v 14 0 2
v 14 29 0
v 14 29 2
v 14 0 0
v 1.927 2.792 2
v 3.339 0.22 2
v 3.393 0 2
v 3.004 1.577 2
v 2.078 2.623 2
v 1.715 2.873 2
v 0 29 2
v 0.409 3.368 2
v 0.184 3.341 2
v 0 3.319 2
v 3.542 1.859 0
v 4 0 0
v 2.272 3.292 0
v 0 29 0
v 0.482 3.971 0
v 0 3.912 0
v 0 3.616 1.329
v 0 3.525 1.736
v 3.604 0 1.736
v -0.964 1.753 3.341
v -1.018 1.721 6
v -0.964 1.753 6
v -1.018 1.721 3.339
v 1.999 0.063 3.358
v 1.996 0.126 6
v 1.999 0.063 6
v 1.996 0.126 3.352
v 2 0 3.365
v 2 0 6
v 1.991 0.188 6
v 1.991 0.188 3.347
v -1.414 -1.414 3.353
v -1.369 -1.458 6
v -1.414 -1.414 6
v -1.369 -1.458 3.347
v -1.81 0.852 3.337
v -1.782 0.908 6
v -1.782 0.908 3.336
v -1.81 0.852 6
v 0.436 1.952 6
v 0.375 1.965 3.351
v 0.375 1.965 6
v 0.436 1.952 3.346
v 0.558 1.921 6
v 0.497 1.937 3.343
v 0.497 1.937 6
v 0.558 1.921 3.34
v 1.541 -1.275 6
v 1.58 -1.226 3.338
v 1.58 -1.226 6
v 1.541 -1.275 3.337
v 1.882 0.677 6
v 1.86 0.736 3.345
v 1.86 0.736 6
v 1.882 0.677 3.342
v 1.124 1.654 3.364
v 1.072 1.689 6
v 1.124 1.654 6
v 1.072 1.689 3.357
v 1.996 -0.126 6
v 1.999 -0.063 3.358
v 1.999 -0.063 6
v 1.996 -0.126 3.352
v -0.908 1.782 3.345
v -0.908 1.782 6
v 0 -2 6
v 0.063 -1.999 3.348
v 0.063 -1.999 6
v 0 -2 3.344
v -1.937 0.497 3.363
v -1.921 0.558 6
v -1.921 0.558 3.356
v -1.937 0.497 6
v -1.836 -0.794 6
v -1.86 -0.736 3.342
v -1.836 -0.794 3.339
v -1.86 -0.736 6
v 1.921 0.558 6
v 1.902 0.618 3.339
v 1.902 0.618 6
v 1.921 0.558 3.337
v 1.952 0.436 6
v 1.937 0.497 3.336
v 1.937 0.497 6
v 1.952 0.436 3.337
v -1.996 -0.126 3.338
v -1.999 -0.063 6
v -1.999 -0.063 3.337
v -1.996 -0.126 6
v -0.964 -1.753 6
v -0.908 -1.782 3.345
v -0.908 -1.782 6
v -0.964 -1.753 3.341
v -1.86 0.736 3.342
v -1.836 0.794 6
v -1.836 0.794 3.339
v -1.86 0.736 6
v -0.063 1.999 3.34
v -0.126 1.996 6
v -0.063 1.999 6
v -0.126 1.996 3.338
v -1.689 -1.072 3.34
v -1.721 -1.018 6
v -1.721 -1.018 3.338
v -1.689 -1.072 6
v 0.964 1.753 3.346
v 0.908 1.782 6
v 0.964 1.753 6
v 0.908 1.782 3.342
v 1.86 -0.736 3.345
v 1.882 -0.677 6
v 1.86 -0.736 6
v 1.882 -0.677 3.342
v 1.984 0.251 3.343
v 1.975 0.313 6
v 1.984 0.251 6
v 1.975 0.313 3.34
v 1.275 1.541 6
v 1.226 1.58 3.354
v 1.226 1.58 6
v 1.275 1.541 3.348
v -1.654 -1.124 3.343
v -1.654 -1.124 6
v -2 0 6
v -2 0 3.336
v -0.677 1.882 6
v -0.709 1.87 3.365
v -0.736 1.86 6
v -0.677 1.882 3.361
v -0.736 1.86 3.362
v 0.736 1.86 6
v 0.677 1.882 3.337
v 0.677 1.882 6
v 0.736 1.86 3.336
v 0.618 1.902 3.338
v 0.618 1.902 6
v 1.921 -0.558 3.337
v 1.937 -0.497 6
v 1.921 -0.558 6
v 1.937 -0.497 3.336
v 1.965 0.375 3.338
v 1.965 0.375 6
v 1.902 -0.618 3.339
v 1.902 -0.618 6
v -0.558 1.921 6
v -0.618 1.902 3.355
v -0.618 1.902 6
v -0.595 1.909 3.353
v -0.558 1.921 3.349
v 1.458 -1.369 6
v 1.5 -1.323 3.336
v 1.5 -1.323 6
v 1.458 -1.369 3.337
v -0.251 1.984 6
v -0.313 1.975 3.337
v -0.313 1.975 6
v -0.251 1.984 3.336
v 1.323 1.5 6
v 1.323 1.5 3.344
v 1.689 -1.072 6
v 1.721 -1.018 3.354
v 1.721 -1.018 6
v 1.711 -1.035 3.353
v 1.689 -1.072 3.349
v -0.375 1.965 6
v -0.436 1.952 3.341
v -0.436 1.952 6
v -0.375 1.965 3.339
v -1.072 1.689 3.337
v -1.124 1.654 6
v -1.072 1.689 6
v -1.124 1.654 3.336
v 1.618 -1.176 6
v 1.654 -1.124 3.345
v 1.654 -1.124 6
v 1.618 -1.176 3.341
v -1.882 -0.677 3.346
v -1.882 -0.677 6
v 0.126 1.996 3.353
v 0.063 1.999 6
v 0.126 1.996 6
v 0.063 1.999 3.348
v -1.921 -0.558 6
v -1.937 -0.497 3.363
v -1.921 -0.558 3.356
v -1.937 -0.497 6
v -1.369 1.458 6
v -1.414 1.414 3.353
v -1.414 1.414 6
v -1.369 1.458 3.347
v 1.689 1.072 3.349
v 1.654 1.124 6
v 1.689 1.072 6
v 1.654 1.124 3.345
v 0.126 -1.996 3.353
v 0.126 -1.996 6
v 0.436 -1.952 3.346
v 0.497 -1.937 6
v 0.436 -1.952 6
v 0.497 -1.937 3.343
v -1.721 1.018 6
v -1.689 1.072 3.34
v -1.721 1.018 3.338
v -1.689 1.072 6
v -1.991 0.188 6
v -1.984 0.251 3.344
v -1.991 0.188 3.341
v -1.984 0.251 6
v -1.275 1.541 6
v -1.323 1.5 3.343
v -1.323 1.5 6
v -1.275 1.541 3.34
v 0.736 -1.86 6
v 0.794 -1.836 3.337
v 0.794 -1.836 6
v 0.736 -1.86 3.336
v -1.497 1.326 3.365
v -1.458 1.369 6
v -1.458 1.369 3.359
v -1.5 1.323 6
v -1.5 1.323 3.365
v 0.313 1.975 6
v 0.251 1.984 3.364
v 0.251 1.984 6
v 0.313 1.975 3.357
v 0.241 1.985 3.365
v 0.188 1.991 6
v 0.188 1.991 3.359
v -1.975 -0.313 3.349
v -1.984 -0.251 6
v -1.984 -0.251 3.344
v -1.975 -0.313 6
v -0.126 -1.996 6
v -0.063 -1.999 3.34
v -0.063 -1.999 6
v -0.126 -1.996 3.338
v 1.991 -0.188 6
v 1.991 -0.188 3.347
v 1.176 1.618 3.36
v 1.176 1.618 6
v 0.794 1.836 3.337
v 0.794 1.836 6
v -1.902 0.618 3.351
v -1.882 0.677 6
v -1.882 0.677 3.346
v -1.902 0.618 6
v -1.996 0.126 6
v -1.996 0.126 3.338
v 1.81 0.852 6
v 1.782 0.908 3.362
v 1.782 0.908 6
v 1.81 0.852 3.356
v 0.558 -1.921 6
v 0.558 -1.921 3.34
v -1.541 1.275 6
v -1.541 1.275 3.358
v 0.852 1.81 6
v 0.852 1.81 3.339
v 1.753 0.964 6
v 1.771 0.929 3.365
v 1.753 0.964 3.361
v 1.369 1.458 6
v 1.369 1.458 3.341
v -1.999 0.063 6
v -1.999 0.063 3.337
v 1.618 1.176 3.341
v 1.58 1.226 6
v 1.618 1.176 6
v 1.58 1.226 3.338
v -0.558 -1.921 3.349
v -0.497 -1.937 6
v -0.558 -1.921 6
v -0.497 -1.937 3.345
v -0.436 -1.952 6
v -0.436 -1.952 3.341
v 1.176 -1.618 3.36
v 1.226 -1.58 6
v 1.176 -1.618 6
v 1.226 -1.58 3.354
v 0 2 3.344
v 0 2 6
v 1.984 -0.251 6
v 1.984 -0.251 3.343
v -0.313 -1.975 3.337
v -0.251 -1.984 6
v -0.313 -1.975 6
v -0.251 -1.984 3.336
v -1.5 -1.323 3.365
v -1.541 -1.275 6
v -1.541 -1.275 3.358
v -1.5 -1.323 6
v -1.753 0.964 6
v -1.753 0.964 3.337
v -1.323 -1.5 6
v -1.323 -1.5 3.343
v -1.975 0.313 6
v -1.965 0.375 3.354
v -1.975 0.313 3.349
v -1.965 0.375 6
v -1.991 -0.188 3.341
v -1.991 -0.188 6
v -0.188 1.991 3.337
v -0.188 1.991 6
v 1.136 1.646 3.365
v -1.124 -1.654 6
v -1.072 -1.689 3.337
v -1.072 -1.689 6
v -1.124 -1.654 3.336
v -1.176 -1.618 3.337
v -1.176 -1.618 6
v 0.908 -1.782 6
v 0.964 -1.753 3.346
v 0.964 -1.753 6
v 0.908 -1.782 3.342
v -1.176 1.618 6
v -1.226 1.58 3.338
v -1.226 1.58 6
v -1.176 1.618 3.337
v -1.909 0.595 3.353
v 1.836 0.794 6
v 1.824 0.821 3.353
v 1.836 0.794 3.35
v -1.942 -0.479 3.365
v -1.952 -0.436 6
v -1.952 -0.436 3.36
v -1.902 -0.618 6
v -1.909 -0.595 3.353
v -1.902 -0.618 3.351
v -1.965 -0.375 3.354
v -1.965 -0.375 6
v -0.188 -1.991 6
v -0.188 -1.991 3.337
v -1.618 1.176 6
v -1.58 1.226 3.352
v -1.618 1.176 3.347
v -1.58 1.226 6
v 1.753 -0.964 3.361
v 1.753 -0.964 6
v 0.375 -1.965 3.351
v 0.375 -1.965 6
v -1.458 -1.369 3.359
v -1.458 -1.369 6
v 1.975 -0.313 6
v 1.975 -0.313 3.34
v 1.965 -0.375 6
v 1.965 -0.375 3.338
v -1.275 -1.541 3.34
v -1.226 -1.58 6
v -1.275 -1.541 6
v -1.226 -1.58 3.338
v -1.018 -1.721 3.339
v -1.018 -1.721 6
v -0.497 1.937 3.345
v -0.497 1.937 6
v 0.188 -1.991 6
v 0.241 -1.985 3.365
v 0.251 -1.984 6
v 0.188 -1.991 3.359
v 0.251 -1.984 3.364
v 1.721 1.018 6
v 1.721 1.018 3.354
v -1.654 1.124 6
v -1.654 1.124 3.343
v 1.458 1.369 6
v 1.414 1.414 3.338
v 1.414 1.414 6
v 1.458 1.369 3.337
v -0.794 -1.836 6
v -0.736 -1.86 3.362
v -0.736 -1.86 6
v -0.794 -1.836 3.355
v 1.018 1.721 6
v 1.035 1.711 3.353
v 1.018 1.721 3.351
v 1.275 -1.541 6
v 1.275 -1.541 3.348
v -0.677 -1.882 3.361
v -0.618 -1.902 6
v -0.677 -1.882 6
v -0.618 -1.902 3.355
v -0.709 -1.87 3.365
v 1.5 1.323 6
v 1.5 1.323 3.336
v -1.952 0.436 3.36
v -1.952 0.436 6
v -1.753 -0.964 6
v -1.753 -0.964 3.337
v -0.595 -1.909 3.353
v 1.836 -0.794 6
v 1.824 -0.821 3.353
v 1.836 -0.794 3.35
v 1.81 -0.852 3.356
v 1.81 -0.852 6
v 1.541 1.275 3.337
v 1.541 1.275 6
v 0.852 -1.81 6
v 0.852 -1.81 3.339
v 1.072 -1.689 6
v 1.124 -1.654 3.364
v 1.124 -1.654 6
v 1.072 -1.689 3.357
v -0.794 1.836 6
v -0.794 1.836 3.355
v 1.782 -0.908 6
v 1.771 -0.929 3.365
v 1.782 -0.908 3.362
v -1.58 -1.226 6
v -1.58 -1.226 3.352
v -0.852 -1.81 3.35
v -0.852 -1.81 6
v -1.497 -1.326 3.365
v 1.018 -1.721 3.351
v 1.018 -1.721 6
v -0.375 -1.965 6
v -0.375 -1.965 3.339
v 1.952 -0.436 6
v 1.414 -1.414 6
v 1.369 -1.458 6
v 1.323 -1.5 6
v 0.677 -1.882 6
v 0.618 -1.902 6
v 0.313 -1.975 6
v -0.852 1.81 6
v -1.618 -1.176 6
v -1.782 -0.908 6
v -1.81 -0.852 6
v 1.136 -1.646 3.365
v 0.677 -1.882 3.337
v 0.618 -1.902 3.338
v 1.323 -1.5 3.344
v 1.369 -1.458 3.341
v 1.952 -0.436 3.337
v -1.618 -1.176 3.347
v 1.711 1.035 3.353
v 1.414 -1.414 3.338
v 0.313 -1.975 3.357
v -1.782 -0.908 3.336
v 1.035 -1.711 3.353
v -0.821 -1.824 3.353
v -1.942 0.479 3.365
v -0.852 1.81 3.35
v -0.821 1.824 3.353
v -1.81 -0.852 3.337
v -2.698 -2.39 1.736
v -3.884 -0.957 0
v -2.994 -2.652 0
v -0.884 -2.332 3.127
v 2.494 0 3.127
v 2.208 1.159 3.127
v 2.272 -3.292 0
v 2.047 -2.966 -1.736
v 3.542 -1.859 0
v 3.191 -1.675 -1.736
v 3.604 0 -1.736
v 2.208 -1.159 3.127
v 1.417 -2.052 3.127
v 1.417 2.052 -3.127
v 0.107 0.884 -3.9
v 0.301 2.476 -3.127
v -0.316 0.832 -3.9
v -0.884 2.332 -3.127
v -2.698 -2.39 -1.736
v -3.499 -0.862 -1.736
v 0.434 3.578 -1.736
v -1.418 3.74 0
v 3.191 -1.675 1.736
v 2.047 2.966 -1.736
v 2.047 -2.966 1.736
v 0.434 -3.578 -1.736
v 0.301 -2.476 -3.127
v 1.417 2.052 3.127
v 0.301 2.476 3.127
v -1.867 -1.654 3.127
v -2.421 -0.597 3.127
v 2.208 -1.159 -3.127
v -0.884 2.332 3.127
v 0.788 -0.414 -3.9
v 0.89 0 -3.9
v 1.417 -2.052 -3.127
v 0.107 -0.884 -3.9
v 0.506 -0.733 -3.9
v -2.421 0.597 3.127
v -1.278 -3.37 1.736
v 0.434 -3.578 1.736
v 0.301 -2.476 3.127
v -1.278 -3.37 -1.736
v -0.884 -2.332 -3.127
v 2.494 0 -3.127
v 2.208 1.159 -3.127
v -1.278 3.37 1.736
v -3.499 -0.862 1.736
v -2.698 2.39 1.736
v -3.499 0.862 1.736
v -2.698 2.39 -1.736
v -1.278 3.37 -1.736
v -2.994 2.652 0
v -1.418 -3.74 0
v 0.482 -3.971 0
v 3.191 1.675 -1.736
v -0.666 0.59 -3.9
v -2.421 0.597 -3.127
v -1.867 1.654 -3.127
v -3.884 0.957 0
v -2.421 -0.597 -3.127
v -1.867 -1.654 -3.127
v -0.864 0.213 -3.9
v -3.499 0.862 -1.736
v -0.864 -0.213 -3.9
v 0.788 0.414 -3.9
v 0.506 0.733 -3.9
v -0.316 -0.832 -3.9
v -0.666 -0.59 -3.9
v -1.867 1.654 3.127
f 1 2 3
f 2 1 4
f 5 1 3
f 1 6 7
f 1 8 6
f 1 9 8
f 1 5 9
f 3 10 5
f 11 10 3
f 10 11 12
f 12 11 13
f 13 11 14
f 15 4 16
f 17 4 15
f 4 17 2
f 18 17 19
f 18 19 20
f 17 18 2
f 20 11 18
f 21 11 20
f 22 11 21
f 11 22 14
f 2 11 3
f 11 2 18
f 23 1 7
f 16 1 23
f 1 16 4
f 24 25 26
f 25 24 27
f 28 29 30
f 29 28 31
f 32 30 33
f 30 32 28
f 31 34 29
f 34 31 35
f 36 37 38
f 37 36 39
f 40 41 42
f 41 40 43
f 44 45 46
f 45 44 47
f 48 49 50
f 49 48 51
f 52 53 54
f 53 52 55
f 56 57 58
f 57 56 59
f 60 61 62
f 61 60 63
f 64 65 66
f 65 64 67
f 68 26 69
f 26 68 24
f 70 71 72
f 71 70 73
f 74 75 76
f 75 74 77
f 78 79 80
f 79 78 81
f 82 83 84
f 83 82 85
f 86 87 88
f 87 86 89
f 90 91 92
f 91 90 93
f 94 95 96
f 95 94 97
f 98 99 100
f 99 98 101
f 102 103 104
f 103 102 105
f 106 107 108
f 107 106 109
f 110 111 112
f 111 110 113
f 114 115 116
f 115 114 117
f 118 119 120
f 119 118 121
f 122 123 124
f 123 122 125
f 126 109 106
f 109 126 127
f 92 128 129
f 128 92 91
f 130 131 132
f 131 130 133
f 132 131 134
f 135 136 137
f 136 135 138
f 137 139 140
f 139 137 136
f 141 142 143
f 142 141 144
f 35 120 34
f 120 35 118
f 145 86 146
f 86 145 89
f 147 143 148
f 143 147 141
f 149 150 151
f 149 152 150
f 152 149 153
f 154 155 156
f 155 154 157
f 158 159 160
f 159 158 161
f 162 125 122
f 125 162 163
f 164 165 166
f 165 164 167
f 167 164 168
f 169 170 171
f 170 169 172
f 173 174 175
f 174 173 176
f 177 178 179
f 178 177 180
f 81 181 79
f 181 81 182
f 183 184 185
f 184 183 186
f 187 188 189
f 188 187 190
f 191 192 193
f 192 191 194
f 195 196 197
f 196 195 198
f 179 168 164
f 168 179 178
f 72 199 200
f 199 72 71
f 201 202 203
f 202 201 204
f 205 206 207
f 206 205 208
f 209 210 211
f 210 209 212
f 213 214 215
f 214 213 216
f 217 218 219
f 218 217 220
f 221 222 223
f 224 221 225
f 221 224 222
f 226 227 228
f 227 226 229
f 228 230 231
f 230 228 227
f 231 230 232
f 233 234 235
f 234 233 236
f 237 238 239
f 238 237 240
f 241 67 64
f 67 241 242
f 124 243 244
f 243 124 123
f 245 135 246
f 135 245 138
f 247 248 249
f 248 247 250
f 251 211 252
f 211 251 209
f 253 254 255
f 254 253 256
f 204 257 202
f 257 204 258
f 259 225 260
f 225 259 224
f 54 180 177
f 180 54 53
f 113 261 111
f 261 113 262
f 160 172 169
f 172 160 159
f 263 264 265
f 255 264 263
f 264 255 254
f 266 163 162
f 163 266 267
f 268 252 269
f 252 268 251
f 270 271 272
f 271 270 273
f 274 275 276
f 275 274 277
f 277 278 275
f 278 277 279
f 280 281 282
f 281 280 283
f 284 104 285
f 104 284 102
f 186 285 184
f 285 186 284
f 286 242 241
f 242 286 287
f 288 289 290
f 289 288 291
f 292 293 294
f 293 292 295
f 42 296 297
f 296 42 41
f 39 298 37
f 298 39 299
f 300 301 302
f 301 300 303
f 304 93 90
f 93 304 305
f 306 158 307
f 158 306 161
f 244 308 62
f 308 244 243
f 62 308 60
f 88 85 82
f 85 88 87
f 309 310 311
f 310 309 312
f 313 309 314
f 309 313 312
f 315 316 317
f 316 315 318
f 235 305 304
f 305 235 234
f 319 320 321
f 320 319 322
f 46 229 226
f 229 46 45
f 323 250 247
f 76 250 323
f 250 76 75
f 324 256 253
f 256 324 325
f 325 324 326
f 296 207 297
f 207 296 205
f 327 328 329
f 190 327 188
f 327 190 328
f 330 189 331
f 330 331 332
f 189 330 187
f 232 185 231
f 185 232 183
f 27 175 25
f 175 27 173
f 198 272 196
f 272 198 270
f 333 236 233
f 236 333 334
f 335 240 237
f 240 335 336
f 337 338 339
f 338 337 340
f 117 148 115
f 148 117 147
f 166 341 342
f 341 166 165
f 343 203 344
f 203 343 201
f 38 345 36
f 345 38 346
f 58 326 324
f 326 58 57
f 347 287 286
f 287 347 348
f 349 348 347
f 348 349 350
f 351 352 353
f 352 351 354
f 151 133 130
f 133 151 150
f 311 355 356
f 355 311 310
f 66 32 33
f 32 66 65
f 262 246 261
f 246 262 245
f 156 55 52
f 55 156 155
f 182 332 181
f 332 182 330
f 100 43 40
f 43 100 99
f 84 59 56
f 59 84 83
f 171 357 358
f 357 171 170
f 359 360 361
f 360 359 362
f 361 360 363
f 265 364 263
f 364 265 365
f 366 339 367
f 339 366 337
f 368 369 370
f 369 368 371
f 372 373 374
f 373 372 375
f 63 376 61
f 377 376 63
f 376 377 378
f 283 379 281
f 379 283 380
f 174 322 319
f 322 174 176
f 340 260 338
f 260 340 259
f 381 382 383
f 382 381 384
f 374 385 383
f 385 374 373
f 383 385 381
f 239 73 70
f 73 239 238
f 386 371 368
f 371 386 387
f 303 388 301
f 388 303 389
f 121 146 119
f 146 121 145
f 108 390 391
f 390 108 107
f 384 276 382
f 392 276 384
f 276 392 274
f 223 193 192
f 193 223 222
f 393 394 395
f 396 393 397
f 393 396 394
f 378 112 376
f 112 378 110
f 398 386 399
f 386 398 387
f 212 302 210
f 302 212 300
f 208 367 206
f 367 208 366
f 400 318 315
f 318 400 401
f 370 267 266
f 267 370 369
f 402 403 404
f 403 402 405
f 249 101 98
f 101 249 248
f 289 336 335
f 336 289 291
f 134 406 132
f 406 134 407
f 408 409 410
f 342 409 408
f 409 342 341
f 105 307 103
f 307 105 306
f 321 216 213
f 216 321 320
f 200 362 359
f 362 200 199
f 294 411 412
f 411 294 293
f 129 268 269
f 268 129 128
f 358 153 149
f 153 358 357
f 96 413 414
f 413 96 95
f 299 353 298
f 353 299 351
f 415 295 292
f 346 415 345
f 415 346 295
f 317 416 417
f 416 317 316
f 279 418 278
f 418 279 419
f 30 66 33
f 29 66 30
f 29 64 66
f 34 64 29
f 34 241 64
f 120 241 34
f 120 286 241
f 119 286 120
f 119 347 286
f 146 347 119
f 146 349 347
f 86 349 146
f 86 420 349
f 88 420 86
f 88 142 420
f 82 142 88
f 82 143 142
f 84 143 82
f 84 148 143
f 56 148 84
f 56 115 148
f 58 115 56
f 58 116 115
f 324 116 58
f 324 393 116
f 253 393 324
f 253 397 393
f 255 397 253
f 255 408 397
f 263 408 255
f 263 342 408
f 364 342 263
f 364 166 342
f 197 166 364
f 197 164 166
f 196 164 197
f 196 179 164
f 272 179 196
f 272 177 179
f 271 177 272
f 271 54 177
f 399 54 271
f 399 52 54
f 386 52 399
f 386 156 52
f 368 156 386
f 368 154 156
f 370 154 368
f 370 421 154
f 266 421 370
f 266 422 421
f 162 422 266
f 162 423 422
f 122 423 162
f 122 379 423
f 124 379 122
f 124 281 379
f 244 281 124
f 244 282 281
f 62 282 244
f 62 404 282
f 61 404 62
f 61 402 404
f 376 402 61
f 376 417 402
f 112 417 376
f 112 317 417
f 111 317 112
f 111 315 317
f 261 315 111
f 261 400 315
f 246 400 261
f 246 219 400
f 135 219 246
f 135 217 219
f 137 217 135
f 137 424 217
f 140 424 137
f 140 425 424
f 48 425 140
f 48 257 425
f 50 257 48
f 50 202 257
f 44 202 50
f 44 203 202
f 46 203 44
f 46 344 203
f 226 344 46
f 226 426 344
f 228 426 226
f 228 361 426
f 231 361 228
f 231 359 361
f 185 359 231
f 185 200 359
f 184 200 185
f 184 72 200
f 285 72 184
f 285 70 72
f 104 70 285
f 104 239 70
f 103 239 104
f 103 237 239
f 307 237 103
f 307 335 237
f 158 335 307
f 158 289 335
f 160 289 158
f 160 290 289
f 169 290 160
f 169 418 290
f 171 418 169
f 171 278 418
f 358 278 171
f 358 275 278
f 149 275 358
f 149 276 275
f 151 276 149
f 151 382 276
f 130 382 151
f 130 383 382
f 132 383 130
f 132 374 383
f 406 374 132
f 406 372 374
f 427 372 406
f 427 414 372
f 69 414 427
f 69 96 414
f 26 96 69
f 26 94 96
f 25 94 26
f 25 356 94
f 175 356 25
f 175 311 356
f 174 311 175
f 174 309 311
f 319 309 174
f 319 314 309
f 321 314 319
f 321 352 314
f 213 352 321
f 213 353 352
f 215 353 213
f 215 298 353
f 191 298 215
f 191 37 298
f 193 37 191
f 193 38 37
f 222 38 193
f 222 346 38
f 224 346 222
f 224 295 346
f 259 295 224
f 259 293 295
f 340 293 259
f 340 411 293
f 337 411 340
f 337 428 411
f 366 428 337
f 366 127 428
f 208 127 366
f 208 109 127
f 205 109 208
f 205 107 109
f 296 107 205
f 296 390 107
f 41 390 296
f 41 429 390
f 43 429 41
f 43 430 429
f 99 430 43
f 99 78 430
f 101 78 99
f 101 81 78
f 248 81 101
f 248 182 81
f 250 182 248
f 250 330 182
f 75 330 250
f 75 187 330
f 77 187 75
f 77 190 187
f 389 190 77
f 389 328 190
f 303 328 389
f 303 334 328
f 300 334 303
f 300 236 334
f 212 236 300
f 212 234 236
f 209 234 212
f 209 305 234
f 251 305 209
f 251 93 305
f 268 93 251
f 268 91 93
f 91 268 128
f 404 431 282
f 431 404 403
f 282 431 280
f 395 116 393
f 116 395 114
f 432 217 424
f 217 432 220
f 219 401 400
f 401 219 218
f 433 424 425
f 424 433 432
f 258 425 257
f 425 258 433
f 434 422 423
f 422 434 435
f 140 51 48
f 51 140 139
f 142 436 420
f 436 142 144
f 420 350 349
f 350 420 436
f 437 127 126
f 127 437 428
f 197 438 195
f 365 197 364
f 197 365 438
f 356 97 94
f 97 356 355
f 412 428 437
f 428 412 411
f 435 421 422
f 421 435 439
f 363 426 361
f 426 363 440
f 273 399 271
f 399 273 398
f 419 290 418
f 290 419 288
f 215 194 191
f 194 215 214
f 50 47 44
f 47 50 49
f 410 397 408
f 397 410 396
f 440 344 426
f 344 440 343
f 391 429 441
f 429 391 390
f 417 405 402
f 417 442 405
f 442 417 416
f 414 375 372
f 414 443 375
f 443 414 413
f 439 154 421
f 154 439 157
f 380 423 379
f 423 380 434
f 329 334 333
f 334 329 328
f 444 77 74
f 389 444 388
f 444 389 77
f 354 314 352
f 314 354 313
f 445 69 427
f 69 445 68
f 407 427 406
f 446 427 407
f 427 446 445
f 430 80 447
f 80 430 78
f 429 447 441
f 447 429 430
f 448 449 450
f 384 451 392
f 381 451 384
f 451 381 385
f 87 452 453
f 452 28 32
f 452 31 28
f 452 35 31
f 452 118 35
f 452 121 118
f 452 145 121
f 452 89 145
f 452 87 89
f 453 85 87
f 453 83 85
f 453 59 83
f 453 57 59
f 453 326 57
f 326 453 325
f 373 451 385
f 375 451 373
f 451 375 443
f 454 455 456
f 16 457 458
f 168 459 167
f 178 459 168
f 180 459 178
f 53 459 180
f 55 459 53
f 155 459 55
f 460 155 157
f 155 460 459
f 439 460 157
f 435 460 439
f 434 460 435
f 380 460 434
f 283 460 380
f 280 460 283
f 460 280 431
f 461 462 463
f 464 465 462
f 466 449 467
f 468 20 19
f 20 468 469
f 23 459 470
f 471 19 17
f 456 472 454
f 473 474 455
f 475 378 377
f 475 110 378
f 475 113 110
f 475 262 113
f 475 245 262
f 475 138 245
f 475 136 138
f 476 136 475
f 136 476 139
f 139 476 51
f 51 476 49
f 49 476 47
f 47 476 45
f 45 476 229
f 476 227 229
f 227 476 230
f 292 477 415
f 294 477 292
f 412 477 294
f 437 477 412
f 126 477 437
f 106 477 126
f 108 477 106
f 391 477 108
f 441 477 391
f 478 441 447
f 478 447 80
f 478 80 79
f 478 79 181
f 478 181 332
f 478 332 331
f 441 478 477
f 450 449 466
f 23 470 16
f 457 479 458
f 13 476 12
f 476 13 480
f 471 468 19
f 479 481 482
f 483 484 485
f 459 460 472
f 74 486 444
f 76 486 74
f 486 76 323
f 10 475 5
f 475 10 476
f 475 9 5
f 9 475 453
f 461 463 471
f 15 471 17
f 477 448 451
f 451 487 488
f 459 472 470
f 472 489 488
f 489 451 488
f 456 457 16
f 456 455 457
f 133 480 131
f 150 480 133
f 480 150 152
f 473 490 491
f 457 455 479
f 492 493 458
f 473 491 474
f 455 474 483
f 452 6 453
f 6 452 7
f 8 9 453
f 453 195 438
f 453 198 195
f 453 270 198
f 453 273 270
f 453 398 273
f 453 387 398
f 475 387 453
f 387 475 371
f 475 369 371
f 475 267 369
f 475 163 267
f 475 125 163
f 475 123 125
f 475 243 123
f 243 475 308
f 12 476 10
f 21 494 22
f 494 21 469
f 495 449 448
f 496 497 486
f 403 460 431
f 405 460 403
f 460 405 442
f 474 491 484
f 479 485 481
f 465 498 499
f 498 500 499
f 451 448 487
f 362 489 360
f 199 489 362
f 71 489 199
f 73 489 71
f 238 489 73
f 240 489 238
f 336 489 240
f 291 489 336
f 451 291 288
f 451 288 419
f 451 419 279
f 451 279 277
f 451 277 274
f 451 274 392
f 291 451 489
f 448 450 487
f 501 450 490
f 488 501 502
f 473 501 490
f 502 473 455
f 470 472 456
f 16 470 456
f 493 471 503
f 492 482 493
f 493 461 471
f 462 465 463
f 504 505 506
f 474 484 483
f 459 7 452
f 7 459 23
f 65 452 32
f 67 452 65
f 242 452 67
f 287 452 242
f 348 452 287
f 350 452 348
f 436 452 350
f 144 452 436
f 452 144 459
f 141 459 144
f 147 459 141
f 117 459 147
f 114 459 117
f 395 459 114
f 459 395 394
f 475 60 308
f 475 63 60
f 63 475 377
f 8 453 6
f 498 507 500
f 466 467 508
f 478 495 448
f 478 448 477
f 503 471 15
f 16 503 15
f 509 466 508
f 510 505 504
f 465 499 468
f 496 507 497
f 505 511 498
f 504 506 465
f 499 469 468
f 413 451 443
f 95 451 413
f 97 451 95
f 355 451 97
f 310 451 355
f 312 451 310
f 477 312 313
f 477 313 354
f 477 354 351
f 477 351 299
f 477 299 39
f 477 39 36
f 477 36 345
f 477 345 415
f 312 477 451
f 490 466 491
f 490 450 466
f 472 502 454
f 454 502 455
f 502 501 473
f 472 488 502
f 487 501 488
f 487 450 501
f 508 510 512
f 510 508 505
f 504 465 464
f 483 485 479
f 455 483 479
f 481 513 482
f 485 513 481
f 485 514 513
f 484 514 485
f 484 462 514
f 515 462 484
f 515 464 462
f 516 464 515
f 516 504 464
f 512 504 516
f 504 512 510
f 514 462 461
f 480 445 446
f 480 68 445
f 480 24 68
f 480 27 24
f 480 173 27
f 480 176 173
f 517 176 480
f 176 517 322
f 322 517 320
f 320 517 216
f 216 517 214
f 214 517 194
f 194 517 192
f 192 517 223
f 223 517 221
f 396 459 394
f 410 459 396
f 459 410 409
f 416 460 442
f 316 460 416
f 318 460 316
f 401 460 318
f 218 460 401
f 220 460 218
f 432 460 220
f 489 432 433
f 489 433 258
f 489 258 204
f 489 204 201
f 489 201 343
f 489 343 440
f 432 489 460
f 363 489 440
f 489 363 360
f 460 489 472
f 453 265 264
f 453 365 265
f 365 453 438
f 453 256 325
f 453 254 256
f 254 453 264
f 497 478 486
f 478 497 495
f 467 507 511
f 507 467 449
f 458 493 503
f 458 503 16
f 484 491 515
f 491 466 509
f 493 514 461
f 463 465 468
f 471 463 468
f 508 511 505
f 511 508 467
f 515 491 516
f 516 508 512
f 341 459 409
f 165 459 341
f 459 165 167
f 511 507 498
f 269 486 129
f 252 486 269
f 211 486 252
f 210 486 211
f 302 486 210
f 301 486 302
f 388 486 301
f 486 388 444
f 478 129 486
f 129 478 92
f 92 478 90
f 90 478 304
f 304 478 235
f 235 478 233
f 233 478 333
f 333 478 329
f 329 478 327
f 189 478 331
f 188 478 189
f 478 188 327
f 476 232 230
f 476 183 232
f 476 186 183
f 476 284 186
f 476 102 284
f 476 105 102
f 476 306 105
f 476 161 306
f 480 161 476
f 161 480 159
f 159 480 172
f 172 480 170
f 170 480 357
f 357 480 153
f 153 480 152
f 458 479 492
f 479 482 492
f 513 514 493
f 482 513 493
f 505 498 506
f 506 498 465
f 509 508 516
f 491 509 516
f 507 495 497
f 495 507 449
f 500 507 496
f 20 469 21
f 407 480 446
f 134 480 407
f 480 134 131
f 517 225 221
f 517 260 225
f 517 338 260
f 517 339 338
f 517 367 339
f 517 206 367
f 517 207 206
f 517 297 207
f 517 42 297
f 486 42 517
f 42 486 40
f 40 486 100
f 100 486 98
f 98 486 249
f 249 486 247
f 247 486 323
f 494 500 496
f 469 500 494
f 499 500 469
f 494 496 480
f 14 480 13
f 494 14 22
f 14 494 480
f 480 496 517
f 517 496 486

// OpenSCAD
cube(size=[14,29,2],center=false);
cylinder(h=6,r=2.,$fn=200,center=false);
sphere(r=4);
